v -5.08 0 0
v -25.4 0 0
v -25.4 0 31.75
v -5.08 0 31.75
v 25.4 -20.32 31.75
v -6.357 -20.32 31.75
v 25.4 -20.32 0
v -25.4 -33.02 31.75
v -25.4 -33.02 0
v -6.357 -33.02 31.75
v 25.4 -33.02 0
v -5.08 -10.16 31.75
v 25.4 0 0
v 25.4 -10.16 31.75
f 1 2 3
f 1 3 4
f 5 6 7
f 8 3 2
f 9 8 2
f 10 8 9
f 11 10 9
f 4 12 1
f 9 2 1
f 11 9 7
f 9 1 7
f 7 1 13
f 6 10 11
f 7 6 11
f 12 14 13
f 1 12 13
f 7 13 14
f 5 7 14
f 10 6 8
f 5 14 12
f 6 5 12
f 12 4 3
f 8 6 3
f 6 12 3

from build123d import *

# Parameters (mm, degrees)
F1_DEPTH = 33.02
F3_DEPTH = 12.7
F5_DEPTH = 30.48


with BuildPart() as f1:
    # F0 (on Front) → F1 (new body)
    with BuildSketch(Plane.XZ):
        Polygon((-25.4, 0), (0, 0), (25.4, 0), (25.4, 31.75), (-25.4, 31.75), align=None)
    extrude(amount=F1_DEPTH)

    # F2 (on face) → F3 (cut)
    with BuildSketch(Plane.XZ.offset(33.02)):
        Polygon((25.4, 31.75), (-6.357383, 31.75), (25.4, 0), align=None)
    extrude(amount=-F3_DEPTH, mode=Mode.SUBTRACT)

    # F4 (on face) → F5 (cut)
    with BuildSketch(Plane.YZ.offset(25.4)):
        Polygon((-10.16, 31.75), (0, 0), (0, 31.75), align=None)
    extrude(amount=-F5_DEPTH, mode=Mode.SUBTRACT)


solid = f1.part
